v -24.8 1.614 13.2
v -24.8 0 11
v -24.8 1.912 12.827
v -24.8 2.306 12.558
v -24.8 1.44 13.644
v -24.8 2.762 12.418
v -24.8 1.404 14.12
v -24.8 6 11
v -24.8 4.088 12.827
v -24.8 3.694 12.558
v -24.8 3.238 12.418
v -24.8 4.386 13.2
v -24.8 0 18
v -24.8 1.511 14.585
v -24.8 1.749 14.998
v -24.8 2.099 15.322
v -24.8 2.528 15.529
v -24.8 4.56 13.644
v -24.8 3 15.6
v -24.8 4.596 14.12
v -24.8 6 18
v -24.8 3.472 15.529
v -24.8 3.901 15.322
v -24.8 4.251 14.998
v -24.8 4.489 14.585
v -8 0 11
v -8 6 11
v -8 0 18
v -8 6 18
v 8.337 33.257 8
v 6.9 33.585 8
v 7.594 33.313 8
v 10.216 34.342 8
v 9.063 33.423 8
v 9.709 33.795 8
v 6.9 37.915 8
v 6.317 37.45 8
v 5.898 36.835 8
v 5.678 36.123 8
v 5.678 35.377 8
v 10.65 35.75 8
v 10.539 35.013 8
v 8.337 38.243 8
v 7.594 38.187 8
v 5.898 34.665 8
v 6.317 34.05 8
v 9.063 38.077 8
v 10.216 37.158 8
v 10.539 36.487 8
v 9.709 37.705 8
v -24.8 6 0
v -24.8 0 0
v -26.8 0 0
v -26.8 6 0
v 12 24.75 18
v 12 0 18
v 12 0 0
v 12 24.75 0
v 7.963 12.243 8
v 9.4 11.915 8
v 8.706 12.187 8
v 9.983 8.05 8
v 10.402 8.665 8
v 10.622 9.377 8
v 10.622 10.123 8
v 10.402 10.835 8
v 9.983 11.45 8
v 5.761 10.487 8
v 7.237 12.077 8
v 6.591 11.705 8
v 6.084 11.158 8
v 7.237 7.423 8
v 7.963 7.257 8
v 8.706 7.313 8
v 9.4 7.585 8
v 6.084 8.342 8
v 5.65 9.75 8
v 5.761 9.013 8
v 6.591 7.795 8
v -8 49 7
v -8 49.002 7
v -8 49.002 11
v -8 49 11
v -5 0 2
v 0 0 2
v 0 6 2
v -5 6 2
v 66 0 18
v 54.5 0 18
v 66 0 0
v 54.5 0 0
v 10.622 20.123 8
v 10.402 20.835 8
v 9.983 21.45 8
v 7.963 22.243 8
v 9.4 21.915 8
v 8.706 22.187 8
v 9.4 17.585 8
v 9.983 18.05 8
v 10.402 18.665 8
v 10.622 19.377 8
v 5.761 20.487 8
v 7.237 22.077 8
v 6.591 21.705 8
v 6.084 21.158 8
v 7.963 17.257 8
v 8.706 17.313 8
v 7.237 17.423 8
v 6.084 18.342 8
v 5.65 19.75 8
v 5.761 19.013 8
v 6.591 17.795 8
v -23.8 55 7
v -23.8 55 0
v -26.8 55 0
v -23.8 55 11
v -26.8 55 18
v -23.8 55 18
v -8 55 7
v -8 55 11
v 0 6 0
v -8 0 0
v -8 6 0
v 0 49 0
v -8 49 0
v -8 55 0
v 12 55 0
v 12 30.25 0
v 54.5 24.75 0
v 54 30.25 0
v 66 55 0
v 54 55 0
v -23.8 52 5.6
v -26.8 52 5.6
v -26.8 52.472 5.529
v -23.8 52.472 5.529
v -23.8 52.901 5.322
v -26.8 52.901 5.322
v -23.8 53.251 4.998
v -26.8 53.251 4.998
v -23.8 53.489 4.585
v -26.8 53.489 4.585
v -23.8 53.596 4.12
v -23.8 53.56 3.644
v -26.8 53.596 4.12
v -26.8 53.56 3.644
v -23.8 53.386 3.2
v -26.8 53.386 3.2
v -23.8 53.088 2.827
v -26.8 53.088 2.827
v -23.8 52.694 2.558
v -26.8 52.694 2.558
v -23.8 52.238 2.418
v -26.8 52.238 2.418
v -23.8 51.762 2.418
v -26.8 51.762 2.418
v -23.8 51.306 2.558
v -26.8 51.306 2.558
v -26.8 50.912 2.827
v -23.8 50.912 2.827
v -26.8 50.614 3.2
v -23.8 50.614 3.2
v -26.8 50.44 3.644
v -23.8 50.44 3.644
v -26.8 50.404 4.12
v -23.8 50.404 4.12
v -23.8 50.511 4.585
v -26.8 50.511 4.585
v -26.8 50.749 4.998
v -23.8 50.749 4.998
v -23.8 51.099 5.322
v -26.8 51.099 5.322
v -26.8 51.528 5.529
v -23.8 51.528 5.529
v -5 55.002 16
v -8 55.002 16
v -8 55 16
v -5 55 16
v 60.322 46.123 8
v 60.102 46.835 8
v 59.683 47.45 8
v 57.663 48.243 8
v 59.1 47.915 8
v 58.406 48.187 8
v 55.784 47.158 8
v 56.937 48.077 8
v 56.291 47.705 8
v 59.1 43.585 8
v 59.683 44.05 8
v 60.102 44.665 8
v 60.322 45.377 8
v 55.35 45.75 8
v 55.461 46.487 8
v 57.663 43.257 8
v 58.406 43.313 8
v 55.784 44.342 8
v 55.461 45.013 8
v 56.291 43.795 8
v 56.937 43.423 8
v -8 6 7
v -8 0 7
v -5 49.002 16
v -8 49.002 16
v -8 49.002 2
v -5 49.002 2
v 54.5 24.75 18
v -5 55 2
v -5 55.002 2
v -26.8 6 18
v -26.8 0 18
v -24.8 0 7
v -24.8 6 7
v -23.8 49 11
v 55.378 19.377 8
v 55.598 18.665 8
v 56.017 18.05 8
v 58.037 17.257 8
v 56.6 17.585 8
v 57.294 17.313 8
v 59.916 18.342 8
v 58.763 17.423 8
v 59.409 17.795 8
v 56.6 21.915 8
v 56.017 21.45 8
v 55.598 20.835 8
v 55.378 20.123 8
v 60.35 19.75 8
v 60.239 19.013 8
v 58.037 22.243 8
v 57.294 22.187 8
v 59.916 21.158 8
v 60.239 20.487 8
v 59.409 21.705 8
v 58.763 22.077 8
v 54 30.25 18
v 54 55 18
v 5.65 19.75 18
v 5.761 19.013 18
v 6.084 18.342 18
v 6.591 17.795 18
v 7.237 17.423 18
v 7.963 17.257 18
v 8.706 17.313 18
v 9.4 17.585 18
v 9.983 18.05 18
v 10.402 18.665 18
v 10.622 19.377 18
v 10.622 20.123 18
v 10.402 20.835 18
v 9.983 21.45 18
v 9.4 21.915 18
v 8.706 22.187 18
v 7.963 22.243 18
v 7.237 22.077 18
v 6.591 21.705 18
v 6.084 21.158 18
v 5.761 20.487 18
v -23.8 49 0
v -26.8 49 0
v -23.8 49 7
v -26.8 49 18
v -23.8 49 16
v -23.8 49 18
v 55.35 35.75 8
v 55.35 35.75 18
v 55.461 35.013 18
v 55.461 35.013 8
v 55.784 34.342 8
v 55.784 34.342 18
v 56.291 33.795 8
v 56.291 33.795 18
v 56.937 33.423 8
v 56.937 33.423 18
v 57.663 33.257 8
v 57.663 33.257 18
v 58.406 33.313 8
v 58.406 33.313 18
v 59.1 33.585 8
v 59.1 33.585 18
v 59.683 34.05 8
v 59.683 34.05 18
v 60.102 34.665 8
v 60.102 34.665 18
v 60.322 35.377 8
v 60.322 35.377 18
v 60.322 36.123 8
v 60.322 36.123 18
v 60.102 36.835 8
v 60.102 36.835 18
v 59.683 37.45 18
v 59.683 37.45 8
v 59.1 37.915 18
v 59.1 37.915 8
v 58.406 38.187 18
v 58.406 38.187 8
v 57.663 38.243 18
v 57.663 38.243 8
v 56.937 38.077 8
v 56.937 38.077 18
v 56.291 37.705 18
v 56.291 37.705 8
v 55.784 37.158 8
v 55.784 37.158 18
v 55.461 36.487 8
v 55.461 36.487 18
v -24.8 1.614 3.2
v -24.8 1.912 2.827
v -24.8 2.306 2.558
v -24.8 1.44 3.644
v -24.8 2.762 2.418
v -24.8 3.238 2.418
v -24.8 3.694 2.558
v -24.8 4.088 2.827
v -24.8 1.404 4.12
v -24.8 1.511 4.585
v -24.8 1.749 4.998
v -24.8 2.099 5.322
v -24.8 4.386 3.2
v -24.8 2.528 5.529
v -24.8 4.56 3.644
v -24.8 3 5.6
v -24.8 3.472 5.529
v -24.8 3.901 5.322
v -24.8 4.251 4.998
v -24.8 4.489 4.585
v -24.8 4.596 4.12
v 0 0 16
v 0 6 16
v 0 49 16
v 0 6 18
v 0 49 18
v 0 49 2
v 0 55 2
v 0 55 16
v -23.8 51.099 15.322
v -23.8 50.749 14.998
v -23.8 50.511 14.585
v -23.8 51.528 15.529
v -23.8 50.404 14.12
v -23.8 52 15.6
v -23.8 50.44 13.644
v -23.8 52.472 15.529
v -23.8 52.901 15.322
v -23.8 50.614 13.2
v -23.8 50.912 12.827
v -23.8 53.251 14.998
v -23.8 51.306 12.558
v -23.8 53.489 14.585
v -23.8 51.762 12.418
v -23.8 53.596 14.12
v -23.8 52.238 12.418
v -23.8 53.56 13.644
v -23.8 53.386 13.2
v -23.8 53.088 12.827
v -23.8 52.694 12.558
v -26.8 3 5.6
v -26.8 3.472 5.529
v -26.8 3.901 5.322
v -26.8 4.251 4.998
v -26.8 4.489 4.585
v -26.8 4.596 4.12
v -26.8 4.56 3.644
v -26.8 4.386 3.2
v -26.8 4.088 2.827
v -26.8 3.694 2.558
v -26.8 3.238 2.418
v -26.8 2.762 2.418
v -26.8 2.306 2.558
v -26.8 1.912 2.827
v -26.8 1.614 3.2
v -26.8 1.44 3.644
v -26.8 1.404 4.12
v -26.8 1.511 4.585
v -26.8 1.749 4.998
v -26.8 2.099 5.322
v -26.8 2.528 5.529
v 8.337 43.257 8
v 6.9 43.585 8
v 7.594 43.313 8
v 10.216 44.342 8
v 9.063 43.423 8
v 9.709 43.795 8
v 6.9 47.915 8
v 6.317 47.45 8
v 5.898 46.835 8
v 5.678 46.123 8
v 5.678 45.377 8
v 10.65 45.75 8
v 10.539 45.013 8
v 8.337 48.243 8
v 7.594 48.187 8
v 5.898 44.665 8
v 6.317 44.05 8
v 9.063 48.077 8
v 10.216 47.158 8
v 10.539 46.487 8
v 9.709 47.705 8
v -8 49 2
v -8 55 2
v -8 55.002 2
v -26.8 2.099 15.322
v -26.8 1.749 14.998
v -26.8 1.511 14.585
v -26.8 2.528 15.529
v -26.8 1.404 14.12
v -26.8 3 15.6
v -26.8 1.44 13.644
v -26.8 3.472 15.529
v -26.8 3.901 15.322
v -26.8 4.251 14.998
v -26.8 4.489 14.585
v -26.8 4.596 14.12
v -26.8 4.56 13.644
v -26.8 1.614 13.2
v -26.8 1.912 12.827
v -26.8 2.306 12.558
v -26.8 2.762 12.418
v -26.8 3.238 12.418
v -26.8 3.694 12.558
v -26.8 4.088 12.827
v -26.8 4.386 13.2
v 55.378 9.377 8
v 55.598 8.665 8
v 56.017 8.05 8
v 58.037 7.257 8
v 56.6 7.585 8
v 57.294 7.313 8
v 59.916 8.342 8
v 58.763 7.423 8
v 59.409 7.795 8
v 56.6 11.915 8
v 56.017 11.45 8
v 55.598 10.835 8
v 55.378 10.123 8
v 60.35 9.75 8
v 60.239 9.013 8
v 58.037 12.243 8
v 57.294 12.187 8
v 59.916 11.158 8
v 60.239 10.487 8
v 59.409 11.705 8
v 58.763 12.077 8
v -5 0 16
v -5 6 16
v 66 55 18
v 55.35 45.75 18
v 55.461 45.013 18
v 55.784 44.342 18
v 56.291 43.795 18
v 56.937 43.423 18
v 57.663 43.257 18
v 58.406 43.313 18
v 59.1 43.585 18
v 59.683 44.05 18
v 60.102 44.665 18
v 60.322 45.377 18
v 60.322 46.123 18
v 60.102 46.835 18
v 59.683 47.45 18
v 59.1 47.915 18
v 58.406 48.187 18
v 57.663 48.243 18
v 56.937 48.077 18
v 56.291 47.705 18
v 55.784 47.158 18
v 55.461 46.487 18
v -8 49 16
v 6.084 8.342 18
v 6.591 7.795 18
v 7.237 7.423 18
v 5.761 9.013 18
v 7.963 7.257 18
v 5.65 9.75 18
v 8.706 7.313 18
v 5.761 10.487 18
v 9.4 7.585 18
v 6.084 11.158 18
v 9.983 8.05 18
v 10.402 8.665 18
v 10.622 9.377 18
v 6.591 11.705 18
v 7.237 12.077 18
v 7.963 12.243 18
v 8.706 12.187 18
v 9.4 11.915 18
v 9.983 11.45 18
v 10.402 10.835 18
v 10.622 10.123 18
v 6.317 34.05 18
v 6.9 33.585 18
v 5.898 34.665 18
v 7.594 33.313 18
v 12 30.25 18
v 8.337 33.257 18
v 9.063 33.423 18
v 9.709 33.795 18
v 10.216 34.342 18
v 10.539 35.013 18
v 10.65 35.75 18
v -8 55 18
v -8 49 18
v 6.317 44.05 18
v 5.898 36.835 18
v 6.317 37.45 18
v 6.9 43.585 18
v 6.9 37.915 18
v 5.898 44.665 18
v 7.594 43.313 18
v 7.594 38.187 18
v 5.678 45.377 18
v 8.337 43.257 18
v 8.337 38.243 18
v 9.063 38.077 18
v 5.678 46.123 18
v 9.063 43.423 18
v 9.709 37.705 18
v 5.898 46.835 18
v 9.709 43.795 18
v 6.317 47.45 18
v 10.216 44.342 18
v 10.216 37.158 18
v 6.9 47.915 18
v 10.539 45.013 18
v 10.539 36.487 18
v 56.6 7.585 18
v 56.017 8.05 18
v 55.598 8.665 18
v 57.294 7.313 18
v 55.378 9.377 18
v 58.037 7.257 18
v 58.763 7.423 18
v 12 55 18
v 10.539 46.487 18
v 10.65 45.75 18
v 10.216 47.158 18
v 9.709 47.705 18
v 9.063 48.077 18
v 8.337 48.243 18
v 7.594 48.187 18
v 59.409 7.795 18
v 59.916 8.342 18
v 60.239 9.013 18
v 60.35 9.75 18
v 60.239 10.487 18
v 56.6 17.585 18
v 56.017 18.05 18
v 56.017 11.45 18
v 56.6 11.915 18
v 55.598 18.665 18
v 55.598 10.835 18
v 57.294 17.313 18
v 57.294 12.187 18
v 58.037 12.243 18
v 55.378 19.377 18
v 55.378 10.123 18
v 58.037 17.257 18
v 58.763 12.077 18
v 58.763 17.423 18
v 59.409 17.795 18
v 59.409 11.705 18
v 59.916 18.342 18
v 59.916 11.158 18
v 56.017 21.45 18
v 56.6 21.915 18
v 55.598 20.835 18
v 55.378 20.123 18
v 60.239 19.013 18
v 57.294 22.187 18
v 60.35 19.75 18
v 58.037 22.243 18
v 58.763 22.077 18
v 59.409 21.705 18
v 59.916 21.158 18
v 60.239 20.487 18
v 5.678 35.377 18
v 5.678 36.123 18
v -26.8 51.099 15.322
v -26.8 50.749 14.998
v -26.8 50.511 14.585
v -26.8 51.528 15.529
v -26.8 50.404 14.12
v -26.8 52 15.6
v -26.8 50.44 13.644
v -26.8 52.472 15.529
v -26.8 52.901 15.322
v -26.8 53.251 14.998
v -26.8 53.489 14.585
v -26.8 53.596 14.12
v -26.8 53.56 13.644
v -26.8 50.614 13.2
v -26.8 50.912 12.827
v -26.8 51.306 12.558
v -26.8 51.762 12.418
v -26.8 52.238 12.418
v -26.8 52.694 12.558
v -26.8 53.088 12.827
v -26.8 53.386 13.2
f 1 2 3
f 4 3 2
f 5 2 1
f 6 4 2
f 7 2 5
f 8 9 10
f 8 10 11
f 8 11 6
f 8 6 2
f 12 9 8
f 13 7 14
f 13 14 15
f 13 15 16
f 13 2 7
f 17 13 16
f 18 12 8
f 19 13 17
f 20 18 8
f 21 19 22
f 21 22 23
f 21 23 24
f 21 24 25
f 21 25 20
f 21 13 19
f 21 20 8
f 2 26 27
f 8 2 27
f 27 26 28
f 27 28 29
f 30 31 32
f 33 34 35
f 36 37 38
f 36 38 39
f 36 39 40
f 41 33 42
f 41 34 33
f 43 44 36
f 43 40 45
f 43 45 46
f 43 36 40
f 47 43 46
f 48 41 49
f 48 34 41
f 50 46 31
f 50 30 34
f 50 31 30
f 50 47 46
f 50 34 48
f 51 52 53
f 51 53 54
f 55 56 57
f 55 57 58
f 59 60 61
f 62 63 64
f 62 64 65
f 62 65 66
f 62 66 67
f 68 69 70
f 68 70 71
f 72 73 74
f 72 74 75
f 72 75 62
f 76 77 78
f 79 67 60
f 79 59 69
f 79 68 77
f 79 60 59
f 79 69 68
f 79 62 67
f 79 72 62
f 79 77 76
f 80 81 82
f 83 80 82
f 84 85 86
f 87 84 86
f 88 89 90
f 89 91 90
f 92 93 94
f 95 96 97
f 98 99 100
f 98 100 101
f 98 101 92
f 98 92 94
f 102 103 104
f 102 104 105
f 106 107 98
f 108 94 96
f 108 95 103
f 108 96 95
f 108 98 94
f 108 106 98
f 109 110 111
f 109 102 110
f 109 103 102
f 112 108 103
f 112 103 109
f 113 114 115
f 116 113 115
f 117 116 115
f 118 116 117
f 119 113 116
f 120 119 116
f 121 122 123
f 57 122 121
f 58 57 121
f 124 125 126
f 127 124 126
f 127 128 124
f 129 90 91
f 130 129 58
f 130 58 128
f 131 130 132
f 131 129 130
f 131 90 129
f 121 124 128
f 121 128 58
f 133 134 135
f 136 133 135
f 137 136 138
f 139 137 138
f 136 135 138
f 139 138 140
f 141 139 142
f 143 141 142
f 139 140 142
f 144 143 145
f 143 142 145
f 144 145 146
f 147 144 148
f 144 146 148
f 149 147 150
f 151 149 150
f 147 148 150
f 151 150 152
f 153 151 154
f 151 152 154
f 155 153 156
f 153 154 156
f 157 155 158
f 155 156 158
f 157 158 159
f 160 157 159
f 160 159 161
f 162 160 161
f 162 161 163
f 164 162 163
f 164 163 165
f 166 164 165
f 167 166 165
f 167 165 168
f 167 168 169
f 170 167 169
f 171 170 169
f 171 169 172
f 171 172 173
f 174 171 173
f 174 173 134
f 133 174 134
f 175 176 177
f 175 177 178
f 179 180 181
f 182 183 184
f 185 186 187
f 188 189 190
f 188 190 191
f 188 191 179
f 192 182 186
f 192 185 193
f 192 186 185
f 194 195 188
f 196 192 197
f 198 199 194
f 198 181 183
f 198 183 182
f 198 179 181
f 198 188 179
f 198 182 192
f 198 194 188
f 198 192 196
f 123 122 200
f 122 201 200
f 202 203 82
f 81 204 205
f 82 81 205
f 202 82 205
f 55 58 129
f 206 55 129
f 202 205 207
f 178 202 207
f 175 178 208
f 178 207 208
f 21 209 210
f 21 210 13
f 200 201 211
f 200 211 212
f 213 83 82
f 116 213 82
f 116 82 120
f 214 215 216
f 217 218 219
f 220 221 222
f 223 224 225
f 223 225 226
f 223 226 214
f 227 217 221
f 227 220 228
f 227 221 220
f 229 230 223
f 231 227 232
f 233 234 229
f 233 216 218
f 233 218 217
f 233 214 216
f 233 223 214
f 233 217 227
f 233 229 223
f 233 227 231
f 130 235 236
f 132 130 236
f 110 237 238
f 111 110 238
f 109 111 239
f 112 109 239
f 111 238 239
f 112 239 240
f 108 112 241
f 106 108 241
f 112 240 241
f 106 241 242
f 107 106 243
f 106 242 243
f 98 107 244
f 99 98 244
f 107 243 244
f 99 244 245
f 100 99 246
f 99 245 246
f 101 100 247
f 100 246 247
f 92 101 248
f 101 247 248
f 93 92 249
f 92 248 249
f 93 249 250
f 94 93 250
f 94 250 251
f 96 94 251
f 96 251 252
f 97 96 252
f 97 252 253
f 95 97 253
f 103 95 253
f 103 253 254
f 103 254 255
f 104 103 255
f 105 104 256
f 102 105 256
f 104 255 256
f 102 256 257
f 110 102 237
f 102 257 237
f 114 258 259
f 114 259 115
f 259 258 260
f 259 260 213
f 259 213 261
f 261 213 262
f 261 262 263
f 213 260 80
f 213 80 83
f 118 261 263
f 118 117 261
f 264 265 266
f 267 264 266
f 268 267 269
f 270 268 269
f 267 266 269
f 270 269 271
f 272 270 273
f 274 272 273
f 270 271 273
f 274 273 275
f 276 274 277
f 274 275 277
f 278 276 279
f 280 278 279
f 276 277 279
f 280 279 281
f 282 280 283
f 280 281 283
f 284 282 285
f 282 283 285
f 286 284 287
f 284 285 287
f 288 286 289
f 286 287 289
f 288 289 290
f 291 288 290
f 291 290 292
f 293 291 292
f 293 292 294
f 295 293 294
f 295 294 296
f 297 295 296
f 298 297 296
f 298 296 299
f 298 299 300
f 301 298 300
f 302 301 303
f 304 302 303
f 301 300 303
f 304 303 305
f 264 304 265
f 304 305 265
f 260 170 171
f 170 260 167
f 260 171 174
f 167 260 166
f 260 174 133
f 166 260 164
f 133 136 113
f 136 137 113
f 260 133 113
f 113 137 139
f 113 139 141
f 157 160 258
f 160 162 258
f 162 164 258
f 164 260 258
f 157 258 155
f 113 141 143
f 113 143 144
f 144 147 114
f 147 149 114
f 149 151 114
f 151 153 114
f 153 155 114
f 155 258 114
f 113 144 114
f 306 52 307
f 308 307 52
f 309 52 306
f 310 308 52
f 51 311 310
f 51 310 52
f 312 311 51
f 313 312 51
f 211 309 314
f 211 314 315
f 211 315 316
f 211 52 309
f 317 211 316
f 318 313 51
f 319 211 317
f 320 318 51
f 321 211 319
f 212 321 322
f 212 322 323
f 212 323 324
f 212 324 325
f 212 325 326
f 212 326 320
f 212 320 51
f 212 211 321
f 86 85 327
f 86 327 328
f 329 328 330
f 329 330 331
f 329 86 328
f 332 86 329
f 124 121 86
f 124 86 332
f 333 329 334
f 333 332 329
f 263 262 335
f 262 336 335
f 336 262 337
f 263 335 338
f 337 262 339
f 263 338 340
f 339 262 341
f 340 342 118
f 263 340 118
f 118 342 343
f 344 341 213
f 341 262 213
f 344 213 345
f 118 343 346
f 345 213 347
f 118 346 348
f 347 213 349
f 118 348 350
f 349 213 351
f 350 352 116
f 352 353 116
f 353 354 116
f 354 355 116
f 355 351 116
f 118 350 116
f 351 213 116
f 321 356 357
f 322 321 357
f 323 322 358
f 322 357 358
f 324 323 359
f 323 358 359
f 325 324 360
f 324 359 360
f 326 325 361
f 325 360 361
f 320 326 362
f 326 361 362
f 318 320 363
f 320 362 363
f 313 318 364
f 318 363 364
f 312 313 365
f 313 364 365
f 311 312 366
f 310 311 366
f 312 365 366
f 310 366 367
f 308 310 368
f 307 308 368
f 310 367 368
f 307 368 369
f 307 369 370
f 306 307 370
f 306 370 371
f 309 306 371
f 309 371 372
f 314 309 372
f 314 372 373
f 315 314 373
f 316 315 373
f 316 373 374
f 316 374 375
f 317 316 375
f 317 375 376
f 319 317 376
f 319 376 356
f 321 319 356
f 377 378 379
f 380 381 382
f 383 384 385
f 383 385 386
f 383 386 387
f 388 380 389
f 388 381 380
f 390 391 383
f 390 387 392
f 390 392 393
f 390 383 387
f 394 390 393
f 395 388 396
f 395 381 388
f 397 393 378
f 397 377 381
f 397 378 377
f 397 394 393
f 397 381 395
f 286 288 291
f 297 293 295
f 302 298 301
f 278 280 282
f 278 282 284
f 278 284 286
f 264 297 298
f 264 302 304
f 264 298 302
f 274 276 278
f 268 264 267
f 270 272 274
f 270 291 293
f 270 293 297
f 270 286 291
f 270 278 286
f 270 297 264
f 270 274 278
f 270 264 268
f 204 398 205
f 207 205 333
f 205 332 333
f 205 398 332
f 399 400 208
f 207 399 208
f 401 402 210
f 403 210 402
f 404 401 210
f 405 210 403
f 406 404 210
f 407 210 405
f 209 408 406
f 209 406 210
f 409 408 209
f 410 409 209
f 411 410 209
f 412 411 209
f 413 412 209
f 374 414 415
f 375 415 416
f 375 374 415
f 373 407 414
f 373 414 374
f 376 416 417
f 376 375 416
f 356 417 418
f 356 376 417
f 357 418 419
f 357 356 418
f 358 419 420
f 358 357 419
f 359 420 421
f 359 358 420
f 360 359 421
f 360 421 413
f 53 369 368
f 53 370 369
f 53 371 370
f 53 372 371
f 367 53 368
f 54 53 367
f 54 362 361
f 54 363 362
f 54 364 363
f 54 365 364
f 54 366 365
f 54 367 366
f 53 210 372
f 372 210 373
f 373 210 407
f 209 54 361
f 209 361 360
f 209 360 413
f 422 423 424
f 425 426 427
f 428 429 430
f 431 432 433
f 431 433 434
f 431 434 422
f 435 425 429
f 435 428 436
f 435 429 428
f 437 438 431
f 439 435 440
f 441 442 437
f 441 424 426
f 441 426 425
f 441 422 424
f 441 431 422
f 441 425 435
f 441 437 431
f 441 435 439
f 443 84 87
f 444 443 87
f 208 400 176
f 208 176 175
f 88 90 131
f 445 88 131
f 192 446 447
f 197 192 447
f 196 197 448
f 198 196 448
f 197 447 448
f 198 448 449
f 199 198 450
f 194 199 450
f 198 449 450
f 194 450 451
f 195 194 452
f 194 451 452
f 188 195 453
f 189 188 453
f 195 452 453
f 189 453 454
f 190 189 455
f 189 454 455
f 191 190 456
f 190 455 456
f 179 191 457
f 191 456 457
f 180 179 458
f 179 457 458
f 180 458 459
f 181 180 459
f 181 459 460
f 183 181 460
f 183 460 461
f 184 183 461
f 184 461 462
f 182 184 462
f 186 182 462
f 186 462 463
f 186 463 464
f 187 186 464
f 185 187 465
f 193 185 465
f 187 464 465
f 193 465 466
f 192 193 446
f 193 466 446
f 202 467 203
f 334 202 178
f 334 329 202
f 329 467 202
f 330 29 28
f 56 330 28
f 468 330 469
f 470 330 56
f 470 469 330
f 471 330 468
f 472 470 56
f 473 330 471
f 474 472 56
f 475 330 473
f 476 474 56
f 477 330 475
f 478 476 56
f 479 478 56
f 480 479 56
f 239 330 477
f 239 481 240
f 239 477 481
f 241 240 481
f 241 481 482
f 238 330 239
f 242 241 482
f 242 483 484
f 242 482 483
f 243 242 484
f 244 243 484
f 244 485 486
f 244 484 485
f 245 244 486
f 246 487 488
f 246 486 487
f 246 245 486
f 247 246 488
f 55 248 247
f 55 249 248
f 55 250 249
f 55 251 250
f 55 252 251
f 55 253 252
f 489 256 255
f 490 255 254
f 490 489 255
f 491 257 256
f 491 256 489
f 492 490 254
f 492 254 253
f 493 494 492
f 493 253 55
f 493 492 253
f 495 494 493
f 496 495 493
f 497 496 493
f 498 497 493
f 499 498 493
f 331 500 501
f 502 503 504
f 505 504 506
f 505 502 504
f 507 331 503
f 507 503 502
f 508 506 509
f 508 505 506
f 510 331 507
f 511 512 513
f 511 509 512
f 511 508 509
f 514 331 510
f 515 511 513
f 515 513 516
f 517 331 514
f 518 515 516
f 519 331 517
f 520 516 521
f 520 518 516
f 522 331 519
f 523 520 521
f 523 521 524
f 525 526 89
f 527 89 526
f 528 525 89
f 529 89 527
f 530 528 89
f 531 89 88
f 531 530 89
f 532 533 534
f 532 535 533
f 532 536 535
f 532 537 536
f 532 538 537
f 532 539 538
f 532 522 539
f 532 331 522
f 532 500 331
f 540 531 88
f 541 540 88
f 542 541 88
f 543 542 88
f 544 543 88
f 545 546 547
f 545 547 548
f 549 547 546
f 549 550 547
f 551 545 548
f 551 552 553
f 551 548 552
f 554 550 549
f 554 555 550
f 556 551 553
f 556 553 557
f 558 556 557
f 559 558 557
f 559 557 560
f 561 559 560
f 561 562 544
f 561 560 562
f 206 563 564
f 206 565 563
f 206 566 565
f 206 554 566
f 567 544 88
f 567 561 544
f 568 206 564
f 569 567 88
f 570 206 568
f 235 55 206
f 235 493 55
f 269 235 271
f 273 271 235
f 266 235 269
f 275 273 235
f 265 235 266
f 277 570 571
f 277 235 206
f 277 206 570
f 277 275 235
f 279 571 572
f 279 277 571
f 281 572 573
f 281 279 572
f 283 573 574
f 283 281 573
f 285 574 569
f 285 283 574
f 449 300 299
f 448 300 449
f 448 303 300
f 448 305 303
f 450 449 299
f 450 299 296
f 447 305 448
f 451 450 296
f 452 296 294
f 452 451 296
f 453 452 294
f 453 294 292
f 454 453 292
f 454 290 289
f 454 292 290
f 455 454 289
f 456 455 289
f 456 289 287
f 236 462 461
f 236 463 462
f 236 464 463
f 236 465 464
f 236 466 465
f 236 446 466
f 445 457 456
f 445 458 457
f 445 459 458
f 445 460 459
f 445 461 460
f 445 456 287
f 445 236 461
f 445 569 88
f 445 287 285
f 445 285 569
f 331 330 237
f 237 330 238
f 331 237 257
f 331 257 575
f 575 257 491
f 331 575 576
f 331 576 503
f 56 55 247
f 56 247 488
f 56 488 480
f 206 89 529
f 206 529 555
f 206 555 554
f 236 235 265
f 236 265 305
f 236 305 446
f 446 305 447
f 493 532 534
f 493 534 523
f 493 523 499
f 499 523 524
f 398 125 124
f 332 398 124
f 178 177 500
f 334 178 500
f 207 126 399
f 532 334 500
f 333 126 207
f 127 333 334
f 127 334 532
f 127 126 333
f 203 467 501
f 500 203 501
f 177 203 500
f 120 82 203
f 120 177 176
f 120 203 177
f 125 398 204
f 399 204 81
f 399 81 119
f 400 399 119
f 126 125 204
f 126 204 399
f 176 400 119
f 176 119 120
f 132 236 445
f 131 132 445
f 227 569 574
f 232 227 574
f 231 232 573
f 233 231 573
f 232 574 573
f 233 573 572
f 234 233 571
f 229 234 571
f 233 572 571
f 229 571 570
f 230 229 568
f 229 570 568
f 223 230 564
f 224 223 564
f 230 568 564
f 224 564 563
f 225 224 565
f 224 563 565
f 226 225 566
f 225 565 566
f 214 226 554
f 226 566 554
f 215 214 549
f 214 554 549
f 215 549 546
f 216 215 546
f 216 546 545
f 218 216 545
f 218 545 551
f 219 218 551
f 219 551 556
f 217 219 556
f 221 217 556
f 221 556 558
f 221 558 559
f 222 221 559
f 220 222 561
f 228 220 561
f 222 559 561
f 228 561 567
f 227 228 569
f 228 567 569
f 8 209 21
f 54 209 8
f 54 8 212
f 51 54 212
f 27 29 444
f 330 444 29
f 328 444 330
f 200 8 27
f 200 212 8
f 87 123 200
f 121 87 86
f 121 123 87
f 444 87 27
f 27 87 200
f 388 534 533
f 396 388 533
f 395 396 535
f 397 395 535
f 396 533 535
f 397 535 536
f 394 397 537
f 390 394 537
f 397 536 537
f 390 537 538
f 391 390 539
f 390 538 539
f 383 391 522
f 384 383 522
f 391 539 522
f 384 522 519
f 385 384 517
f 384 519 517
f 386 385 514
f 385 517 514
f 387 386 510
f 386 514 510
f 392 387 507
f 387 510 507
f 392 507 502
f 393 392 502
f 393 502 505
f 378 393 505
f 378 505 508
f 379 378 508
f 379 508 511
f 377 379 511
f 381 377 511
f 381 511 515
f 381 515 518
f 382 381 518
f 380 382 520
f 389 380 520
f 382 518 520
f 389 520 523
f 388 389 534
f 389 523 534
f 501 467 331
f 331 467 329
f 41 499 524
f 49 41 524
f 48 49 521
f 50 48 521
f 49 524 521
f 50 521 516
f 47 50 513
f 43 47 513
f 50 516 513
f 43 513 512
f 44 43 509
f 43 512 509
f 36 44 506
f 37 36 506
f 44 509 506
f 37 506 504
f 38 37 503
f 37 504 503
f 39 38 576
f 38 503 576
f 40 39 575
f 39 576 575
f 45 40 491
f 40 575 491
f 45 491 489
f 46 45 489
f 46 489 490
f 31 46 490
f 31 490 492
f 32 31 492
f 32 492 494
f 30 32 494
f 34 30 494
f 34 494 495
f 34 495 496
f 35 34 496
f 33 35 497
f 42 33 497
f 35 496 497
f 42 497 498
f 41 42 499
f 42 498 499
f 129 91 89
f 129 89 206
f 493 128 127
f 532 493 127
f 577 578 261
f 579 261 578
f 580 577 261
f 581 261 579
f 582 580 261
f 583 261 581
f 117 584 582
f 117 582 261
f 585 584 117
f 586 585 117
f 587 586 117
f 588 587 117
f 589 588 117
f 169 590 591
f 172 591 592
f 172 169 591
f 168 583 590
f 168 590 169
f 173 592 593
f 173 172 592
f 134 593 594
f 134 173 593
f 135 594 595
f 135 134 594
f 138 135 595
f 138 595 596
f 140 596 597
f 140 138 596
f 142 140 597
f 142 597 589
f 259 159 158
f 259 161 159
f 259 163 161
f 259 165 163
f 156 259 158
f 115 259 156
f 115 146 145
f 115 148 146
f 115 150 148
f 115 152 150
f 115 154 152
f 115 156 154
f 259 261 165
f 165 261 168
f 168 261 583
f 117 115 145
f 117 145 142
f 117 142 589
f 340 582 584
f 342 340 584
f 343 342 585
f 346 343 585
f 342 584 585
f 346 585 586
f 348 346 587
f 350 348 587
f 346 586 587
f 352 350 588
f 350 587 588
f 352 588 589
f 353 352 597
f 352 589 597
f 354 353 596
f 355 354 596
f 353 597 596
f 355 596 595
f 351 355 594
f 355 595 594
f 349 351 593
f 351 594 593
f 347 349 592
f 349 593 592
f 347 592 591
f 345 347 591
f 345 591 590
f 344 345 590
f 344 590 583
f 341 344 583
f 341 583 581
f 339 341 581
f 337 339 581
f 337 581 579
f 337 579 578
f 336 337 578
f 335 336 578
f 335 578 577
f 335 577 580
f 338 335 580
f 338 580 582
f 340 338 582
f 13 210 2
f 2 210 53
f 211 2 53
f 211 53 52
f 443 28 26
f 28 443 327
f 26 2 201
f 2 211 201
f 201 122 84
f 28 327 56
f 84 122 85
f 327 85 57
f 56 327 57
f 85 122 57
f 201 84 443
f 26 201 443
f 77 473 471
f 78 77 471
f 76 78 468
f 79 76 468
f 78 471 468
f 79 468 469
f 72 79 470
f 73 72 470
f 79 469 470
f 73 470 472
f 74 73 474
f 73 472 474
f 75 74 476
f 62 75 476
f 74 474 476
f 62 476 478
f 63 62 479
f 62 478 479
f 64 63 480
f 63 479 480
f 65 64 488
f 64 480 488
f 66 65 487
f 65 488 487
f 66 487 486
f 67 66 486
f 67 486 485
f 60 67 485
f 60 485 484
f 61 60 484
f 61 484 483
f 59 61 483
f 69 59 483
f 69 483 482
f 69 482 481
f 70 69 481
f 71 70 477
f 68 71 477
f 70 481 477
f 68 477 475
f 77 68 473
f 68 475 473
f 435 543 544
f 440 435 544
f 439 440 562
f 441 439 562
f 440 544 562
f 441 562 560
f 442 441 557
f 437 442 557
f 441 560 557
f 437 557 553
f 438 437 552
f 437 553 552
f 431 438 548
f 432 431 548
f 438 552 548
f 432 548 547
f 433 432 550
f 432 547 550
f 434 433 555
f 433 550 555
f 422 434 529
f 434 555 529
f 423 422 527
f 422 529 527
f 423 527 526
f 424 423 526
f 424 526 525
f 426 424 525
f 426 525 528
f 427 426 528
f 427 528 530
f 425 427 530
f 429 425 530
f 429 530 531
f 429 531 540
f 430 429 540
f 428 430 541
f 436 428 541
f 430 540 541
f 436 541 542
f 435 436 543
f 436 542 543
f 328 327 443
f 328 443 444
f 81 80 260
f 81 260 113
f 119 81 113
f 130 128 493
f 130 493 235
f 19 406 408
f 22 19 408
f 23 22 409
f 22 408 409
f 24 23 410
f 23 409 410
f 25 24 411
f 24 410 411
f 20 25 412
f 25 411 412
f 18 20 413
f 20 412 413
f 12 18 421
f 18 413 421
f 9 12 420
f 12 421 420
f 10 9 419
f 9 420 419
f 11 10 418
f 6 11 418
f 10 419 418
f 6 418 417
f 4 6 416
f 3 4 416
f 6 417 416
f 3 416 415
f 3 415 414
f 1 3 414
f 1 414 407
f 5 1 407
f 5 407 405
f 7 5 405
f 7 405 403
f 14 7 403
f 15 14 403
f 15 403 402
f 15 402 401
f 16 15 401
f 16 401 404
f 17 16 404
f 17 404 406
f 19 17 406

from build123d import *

# Parameters (mm, degrees)
SKETCH2_W               = 66
SKETCH2_H               = 55
SKETCH2_W_2             = 42
SKETCH2_H_2             = 20.5
SKETCH2_W_3             = 42.5
BOSS_EXTRUDE1_DEPTH     = 18
SKETCH3_R               = 2.5
CUT_EXTRUDE1_DEPTH      = 10
SKETCH5_W               = 2
SKETCH5_H               = 6
BOSS_EXTRUDE2_DEPTH     = 26.8
BOSS_EXTRUDE3_REACH     = 89.39
SKETCH6_W               = 3
SKETCH6_H               = 6
SKETCH6_W_2             = 2
SKETCH7_R               = 1.6
CUT_EXTRUDE2_DEPTH      = 10
CUT_EXTRUDE3_REACH      = 89.778
SKETCH8_W               = 42
SKETCH8_H               = 4.25
SKETCH8_W_2             = 42.5
SKETCH9_W               = 3
SKETCH9_H               = 6
BOSS_EXTRUDE5_DEPTH     = 14
CUT_EXTRUDE4_DEPTH      = 21
CUT_EXTRUDE4_DEPTH_BACK = 10
SKETCH10_W              = 15.8
SKETCH10_H              = 6.002189295
SKETCH11_W              = 4
SKETCH11_H              = 6
BOSS_EXTRUDE6_DEPTH     = 15.8
SKETCH12_W              = 3
SKETCH12_H              = 6
BOSS_EXTRUDE7_DEPTH     = 14
CUT_EXTRUDE5_DEPTH      = 18
CUT_EXTRUDE5_DEPTH_BACK = 10
SKETCH13_W              = 16.8
SKETCH13_H              = 6
SKETCH14_W              = 4
SKETCH14_H              = 6
BOSS_EXTRUDE8_DEPTH     = 16.8


with BuildPart() as part:
    # Sketch2 → Boss-Extrude1 (new body)
    with BuildSketch(Plane.XY):
        with Locations((33, 27.5)):
            Rectangle(SKETCH2_W, SKETCH2_H)
        with Locations((33, 40.5)):
            Rectangle(SKETCH2_W_2, SKETCH2_H_2, mode=Mode.SUBTRACT)
        with Locations((33.25, 14.5)):
            Rectangle(SKETCH2_W_3, SKETCH2_H_2, mode=Mode.SUBTRACT)
    extrude(amount=BOSS_EXTRUDE1_DEPTH)

    # Sketch3 → Cut-Extrude1 (cut)
    with BuildSketch(Plane.XY.offset(18)):
        with Locations((8.15, 45.75)):
            Circle(SKETCH3_R)
        with Locations((8.15, 35.75)):
            Circle(SKETCH3_R)
        with Locations(Location((57.85, 35.75, 0), (0, 0, 180))):
            Circle(SKETCH3_R)
        with Locations(Location((57.85, 45.75, 0), (0, 0, 180))):
            Circle(SKETCH3_R)
        with Locations(Location((8.15, 19.75, 0), (0, 0, 180))):
            Circle(SKETCH3_R)
        with Locations(Location((8.15, 9.75, 0), (0, 0, 180))):
            Circle(SKETCH3_R)
        with Locations((57.85, 9.75)):
            Circle(SKETCH3_R)
        with Locations((57.85, 19.75)):
            Circle(SKETCH3_R)
    extrude(amount=-CUT_EXTRUDE1_DEPTH, mode=Mode.SUBTRACT)

    # Sketch5 → Boss-Extrude2 (add)
    with BuildSketch(Plane.ZY):
        with Locations((1, 52)):
            Rectangle(SKETCH5_W, SKETCH5_H)
        with Locations((17, 52)):
            Rectangle(SKETCH5_W, SKETCH5_H)
        with Locations((1, 3)):
            Rectangle(SKETCH5_W, SKETCH5_H)
        with Locations((17, 3)):
            Rectangle(SKETCH5_W, SKETCH5_H)
    extrude(amount=BOSS_EXTRUDE2_DEPTH)

    # Sketch6 → Boss-Extrude3 (add, up to next)
    with BuildSketch(Plane.XY.offset(2), mode=Mode.PRIVATE) as boss_extrude3_sk1:
        with Locations((-25.3, 52)):
            Rectangle(SKETCH6_W, SKETCH6_H)
    boss_extrude3_tool1 = extrude(boss_extrude3_sk1.sketch, amount=BOSS_EXTRUDE3_REACH, mode=Mode.PRIVATE) - part.part
    # Sketch6 → Boss-Extrude3 (add, up to next)
    with BuildSketch(Plane.XY.offset(2), mode=Mode.PRIVATE) as boss_extrude3_sk2:
        with Locations((-25.8, 3)):
            Rectangle(SKETCH6_W_2, SKETCH6_H)
    boss_extrude3_tool2 = extrude(boss_extrude3_sk2.sketch, amount=BOSS_EXTRUDE3_REACH, mode=Mode.PRIVATE) - part.part
    add(boss_extrude3_tool1.solids().sort_by_distance((-25.3, 52, 2))[0])
    add(boss_extrude3_tool2.solids().sort_by_distance((-25.8, 3, 2))[0])

    # Sketch7 → Cut-Extrude2 (cut)
    with BuildSketch(Plane.ZY.offset(26.8)):
        with Locations((4, 52)):
            Circle(SKETCH7_R)
        with Locations((14, 52)):
            Circle(SKETCH7_R)
        with Locations((4, 3)):
            Circle(SKETCH7_R)
        with Locations((14, 3)):
            Circle(SKETCH7_R)
    extrude(amount=-CUT_EXTRUDE2_DEPTH, mode=Mode.SUBTRACT)

    # Sketch8 → Cut-Extrude3 (cut, up to next)
    with BuildSketch(Plane.XY.offset(18), mode=Mode.PRIVATE) as cut_extrude3_sk1:
        with Locations((33, 52.875)):
            Rectangle(SKETCH8_W, SKETCH8_H)
    cut_extrude3_tool1 = extrude(cut_extrude3_sk1.sketch, amount=-CUT_EXTRUDE3_REACH, mode=Mode.PRIVATE) & part.part
    # Sketch8 → Cut-Extrude3 (cut, up to next)
    with BuildSketch(Plane.XY.offset(18), mode=Mode.PRIVATE) as cut_extrude3_sk2:
        with Locations((33.25, 2.125)):
            Rectangle(SKETCH8_W_2, SKETCH8_H)
    cut_extrude3_tool2 = extrude(cut_extrude3_sk2.sketch, amount=-CUT_EXTRUDE3_REACH, mode=Mode.PRIVATE) & part.part
    add(cut_extrude3_tool1.solids().sort_by_distance((33, 52.875, 18))[0], mode=Mode.SUBTRACT)
    add(cut_extrude3_tool2.solids().sort_by_distance((33.25, 2.125, 18))[0], mode=Mode.SUBTRACT)

    # Sketch9 → Boss-Extrude5 (add)
    with BuildSketch(Plane.XY.offset(2)):
        with Locations((-6.5, 52.002189295)):
            Rectangle(SKETCH9_W, SKETCH9_H)
    extrude(amount=BOSS_EXTRUDE5_DEPTH)

    # Sketch10 → Cut-Extrude4 (cut, two sides: drawn at the far end of the back side and taken through both)
    with BuildSketch(Plane(origin=(0, 0, 16), x_dir=(-1, 0, 0), z_dir=(0, 0, -1)).offset(-CUT_EXTRUDE4_DEPTH_BACK)):
        with Locations((15.9, 52.001094647)):
            Rectangle(SKETCH10_W, SKETCH10_H)
    extrude(amount=CUT_EXTRUDE4_DEPTH + CUT_EXTRUDE4_DEPTH_BACK, mode=Mode.SUBTRACT)


with BuildPart() as cut_extrude4_piece_1:
    # of the separate pieces the step leaves, piece 1, a body of its own (cut_extrude4_pieces)
    add(part.part.solids().sort_by_distance((12, 55, 0))[0])



with BuildPart() as cut_extrude4_piece_2:
    # of the separate pieces the step leaves, piece 2, a body of its own (cut_extrude4_pieces)
    add(part.part.solids().sort_by_distance((-23.8, 55, 0))[0])


with BuildPart() as cut_extrude4_piece_1_1:
    add(cut_extrude4_piece_1.part)

    add(cut_extrude4_piece_2.part)  # Boss-Extrude6 merges Cut-Extrude4 piece 2
    # Sketch11 → Boss-Extrude6 (add)
    with BuildSketch(Plane.ZY.offset(8)):
        with Locations((9, 52)):
            Rectangle(SKETCH11_W, SKETCH11_H)
    extrude(amount=BOSS_EXTRUDE6_DEPTH)

    # Sketch12 → Boss-Extrude7 (add)
    with BuildSketch(Plane.XY.offset(2)):
        with Locations((-6.5, 3)):
            Rectangle(SKETCH12_W, SKETCH12_H)
    extrude(amount=BOSS_EXTRUDE7_DEPTH)

    # Sketch13 → Cut-Extrude5 (cut, two sides: drawn at the far end of the back side and taken through both)
    with BuildSketch(Plane(origin=(0, 0, 16), x_dir=(-1, 0, 0), z_dir=(0, 0, -1)).offset(-CUT_EXTRUDE5_DEPTH_BACK)):
        with Locations((16.4, 3)):
            Rectangle(SKETCH13_W, SKETCH13_H)
    extrude(amount=CUT_EXTRUDE5_DEPTH + CUT_EXTRUDE5_DEPTH_BACK, mode=Mode.SUBTRACT)


with BuildPart() as cut_extrude5_piece_1:
    # of the separate pieces the step leaves, piece 1, a body of its own (cut_extrude5_pieces)
    add(cut_extrude4_piece_1_1.part.solids().sort_by_distance((-23.8, 55, 0))[0])



with BuildPart() as cut_extrude5_piece_2:
    # of the separate pieces the step leaves, piece 2, a body of its own (cut_extrude5_pieces)
    add(cut_extrude4_piece_1_1.part.solids().sort_by_distance((-24.8, 0, 18))[0])


with BuildPart() as cut_extrude5_piece_1_1:
    add(cut_extrude5_piece_1.part)

    add(cut_extrude5_piece_2.part)  # Boss-Extrude8 merges Cut-Extrude5 piece 2
    # Sketch14 → Boss-Extrude8 (add)
    with BuildSketch(Plane.ZY.offset(8)):
        with Locations((9, 3)):
            Rectangle(SKETCH14_W, SKETCH14_H)
    extrude(amount=BOSS_EXTRUDE8_DEPTH)


solid = cut_extrude5_piece_1_1.part
